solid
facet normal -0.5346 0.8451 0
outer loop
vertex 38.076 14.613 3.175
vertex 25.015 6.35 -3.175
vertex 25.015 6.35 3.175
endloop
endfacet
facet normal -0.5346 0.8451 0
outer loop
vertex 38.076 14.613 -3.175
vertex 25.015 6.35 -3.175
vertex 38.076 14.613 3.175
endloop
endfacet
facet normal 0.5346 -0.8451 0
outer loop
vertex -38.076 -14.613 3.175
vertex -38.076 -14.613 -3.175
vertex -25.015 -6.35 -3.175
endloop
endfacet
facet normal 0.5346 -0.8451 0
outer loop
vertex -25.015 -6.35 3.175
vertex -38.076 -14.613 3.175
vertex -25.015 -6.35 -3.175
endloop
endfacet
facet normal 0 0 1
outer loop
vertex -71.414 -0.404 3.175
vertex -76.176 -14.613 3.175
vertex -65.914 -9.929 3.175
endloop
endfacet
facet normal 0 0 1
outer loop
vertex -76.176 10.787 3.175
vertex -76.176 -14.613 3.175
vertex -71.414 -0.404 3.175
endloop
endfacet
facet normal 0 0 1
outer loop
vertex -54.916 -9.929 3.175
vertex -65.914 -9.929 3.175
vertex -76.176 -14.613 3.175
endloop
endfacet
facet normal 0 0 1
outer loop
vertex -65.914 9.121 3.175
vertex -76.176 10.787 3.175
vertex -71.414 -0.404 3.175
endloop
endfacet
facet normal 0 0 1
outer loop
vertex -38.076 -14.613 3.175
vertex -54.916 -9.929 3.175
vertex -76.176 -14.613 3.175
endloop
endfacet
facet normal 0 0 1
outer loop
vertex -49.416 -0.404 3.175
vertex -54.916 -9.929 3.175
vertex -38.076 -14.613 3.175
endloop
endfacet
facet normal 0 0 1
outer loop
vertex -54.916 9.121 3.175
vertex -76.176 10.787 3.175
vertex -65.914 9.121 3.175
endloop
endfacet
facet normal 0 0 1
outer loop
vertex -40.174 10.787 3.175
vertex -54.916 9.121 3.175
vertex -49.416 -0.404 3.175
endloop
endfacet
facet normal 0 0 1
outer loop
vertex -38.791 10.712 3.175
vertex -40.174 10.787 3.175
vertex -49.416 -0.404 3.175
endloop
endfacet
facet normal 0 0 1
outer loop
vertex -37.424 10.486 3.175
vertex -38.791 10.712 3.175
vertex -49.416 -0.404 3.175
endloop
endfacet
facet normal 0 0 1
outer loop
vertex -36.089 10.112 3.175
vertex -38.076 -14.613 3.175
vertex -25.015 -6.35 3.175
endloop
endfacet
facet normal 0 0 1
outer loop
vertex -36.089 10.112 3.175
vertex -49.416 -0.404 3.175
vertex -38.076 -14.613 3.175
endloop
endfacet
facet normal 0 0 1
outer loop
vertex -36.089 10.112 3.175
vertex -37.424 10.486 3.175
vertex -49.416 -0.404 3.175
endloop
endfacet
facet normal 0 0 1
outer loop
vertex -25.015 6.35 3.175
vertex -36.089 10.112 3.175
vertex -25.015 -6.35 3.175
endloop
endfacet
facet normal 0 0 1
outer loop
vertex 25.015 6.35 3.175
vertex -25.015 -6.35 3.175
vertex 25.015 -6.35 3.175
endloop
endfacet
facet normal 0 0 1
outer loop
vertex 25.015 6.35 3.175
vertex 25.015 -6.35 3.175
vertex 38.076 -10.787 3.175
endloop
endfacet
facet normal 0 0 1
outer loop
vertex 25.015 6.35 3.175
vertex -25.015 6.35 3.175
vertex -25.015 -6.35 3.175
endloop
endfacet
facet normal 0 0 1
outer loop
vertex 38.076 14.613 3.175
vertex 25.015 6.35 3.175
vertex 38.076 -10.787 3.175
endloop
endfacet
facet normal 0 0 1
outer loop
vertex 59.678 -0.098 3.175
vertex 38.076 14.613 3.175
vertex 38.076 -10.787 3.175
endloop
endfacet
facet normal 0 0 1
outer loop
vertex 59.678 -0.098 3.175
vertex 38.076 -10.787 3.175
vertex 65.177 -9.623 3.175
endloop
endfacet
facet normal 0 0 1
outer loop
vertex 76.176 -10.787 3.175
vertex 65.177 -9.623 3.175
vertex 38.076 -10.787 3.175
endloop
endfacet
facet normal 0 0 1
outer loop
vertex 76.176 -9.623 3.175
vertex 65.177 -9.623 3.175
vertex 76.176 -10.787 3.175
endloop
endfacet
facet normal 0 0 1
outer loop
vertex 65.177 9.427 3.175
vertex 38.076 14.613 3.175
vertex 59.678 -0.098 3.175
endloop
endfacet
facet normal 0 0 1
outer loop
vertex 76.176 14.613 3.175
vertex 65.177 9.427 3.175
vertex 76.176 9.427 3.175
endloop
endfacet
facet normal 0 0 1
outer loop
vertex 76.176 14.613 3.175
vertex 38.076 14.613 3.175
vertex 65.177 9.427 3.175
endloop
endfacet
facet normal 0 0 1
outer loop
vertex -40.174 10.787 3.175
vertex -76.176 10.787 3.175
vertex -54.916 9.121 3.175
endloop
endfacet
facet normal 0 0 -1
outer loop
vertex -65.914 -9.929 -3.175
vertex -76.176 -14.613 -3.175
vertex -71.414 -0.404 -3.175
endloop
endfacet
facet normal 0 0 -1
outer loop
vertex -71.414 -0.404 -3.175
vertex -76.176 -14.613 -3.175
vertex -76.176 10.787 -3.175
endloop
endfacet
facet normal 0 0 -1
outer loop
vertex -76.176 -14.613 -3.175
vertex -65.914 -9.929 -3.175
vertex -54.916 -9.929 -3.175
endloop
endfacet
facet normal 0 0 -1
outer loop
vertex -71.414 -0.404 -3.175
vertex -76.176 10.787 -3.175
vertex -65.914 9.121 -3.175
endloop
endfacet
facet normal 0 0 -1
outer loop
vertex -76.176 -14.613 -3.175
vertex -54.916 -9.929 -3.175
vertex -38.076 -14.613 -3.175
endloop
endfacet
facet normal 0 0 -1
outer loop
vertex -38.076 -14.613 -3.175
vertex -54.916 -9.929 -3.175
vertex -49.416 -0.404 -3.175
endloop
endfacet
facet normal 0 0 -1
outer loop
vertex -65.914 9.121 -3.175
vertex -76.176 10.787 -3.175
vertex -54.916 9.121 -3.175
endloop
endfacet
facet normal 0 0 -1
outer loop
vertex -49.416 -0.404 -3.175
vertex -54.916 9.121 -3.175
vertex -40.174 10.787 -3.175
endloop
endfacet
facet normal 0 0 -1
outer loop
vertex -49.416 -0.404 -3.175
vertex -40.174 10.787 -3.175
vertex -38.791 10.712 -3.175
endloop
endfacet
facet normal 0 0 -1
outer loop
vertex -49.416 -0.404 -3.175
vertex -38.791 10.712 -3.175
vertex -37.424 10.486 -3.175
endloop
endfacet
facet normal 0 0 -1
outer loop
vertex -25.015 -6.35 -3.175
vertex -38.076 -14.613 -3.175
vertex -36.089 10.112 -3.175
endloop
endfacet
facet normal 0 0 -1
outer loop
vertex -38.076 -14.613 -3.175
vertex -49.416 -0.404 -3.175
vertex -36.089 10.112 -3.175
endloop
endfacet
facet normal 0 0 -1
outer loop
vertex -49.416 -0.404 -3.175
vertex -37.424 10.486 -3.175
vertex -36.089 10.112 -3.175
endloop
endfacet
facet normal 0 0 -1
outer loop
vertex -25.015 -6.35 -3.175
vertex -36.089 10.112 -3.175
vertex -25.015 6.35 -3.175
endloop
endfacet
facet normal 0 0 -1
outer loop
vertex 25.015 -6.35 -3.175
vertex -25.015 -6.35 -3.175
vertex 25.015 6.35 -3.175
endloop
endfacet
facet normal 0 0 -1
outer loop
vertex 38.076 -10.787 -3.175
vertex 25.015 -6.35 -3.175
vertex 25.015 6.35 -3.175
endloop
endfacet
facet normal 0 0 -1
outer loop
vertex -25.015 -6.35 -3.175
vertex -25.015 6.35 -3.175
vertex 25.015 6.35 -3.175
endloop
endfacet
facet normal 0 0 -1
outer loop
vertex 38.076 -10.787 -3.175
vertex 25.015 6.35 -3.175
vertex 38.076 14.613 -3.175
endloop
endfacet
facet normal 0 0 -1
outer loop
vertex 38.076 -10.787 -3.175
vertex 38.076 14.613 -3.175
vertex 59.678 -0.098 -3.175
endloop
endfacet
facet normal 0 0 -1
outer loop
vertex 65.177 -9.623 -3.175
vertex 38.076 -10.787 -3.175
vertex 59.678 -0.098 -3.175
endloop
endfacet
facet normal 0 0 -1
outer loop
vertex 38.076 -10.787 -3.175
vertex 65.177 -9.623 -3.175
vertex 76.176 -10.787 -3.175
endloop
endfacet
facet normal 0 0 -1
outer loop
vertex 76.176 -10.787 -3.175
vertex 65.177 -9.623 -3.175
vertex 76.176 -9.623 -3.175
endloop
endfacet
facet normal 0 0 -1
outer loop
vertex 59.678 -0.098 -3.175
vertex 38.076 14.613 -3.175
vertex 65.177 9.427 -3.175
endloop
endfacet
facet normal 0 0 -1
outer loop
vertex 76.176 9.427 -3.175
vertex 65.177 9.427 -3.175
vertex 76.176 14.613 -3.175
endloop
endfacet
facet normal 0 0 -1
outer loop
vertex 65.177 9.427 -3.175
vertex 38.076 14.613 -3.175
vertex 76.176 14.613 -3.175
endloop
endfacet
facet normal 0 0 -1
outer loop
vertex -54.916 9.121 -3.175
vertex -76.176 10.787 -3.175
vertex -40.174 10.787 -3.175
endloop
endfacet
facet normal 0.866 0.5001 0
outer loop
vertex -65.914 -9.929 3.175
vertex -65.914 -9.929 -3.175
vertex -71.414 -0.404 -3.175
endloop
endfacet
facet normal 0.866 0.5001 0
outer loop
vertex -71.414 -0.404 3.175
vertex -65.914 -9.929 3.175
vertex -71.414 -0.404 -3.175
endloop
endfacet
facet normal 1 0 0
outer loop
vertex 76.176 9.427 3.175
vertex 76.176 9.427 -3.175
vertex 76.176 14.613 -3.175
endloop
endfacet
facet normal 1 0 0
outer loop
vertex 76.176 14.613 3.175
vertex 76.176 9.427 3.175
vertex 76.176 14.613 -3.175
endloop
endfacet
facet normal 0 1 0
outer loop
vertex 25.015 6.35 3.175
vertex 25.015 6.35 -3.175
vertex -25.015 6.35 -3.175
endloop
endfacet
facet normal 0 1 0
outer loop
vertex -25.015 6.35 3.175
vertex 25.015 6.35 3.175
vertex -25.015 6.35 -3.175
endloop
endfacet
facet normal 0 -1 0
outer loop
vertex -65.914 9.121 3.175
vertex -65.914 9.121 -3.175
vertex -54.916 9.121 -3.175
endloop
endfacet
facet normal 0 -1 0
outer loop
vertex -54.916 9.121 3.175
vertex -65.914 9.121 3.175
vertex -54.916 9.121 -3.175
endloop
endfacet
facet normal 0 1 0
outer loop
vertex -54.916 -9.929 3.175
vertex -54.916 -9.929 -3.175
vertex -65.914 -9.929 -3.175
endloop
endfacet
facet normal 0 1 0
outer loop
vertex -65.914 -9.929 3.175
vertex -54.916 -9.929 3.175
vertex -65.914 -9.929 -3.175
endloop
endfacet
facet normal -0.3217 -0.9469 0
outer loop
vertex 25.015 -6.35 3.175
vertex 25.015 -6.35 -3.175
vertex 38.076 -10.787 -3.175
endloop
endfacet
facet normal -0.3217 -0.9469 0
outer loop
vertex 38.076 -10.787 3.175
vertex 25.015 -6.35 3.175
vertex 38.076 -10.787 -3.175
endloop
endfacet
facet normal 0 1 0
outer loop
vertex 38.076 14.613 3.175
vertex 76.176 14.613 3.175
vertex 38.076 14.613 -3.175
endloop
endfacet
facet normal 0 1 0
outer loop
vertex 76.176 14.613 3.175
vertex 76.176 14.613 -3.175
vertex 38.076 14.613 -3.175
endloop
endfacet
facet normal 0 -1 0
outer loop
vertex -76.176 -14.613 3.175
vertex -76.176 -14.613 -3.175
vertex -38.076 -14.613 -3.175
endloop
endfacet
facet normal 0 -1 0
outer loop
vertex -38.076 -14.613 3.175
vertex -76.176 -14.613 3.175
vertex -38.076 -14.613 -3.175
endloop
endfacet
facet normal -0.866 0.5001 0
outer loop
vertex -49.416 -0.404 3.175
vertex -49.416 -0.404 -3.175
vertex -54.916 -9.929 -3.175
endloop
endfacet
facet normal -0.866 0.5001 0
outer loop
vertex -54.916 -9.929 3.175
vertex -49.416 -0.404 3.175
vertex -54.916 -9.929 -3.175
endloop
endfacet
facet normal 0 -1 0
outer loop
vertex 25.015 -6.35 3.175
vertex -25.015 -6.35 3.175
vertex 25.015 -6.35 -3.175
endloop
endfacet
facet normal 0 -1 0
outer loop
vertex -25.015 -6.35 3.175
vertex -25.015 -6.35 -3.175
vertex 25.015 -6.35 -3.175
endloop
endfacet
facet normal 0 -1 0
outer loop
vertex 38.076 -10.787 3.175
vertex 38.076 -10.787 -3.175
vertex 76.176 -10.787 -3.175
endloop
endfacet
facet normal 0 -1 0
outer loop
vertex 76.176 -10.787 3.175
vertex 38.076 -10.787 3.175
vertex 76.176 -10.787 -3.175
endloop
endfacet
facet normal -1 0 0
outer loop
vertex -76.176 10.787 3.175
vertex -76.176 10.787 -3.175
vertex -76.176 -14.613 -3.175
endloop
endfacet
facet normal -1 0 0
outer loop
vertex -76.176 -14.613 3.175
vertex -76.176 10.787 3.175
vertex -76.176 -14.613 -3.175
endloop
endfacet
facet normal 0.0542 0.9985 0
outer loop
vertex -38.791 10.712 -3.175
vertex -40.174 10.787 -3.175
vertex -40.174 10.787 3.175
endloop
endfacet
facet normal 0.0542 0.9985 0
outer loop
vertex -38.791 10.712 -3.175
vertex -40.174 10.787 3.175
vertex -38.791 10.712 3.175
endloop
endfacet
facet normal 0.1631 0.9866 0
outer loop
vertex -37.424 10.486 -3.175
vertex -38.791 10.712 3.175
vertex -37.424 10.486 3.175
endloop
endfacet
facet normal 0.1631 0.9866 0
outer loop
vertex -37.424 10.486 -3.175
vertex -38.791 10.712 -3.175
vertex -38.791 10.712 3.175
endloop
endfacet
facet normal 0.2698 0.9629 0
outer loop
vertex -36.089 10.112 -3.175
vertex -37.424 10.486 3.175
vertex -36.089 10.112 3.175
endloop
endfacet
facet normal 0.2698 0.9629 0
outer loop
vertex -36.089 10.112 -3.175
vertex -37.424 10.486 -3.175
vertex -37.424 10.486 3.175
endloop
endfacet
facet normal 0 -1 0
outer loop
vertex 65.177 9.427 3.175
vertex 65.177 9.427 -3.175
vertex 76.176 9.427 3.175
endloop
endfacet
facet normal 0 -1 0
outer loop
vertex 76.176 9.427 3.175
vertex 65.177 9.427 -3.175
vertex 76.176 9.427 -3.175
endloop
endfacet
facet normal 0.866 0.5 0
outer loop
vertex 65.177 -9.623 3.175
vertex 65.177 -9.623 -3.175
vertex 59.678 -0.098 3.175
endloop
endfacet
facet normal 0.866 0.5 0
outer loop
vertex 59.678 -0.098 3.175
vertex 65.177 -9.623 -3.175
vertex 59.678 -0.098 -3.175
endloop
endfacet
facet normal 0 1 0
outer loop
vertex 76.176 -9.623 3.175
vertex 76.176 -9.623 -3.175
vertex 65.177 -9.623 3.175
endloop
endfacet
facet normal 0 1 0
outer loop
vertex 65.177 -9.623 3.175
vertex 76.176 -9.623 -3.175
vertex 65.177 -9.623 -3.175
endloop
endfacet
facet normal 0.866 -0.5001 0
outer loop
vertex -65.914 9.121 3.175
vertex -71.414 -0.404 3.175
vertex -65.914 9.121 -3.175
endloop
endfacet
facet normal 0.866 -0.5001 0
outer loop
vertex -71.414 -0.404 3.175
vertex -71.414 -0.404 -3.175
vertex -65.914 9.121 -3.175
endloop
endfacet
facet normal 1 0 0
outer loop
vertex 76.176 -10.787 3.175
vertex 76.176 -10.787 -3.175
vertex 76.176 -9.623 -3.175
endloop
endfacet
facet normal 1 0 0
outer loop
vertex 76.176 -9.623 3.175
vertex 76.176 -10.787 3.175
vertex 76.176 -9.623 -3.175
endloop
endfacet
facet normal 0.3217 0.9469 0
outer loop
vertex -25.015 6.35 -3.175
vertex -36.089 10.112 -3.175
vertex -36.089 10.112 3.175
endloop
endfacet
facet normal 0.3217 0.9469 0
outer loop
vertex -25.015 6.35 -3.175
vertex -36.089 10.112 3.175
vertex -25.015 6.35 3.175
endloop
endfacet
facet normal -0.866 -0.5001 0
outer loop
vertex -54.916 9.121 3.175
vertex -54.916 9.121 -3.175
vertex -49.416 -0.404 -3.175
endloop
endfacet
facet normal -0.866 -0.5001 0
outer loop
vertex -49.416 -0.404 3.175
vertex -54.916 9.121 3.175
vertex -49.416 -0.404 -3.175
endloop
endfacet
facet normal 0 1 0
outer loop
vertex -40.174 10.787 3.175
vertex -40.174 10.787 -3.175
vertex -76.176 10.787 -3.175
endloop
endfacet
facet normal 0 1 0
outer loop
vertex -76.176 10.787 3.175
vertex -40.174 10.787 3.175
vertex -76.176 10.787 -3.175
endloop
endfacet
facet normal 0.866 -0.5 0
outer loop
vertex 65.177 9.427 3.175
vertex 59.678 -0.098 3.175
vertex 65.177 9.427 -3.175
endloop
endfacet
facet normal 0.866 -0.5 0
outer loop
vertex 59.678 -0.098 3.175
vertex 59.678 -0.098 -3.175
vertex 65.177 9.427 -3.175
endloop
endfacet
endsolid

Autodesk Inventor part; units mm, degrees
ref_plane "YZ Plane" through (0, 0, 0) normal (1, 0, 0) x (0, 1, 0)
ref_plane "XZ Plane" through (0, 0, 0) normal (0, 1, 0) x (-1, 0, 0)
ref_plane "XY Plane" through (0, 0, 0) normal (0, 0, 1) x (1, 0, 0)
sketch "Sketch1" plane through (0, 0, 0) normal (0, 0, 1) x (1, 0, 0)
  line L0 (76.176, -10.7873) -> (76.176, 14.6127)
  line L1 (-76.176, 10.7873) -> (-76.176, -14.6127)
  line L2 (-76.176, -14.6127) -> (76.176, 14.6127) construction
  line L3 (76.176, -10.7873) -> (-76.176, 10.7873) construction
  line L4 (76.176, 9.4269) -> (81.6753, -0.0981)
  line L5 (81.6753, -0.0981) -> (76.176, -9.6231)
  line L6 (76.176, -9.6231) -> (65.1775, -9.6231)
  line L7 (65.1775, -9.6231) -> (59.6782, -0.0981)
  line L8 (59.6782, -0.0981) -> (65.1775, 9.4269)
  line L9 (65.1775, 9.4269) -> (76.176, 9.4269)
  line L10 (76.176, 9.4269) -> (76.176, -9.6231) construction
  line L11 (-54.9157, 9.1213) -> (-49.4164, -0.4037)
  line L12 (-49.4164, -0.4037) -> (-54.9157, -9.9287)
  line L13 (-54.9157, -9.9287) -> (-65.9142, -9.9287)
  line L14 (-65.9142, -9.9287) -> (-71.4135, -0.4037)
  line L15 (-71.4135, -0.4037) -> (-65.9142, 9.1213)
  line L16 (-65.9142, 9.1213) -> (-54.9157, 9.1213)
  line L17 (-76.176, -14.6127) -> (-38.076, -14.6127) construction
  line L18 (-38.076, -14.6127) -> (-38.076, 10.7873) construction
  line L19 (-40.1744, 10.7873) -> (-76.176, 10.7873) construction
  line L20 (-76.176, 10.7873) -> (-76.176, -14.6127) construction
  line L21 (76.176, 14.6127) -> (38.076, 14.6127) construction
  line L22 (38.076, 14.6127) -> (38.076, -10.7873) construction
  line L23 (38.076, -10.7873) -> (76.176, -10.7873) construction
  line L24 (76.176, -10.7873) -> (76.176, 14.6127) construction
  line L25 (-25.0148, -6.35) -> (25.0148, -6.35) construction
  line L26 (25.0148, -6.35) -> (25.0148, 6.35) construction
  line L27 (25.0148, 6.35) -> (-25.0148, 6.35) construction
  line L28 (-25.0148, 6.35) -> (-25.0148, -6.35) construction
  line L29 (-25.0148, -6.35) -> (25.0148, 6.35) construction
  line L30 (25.0148, -6.35) -> (-25.0148, 6.35) construction
  line L31 (-36.0891, 10.1123) -> (-25.0148, 6.35)
  line L32 (25.0148, 6.35) -> (38.076, 14.6127)
  line L33 (25.0148, 6.35) -> (-25.0148, 6.35)
  line L34 (-38.076, -14.6127) -> (-25.0148, -6.35)
  line L35 (-25.0148, -6.35) -> (25.0148, -6.35)
  line L36 (25.0148, -6.35) -> (38.076, -10.7873)
  line L37 (76.176, 14.6127) -> (38.076, 14.6127)
  line L38 (-38.076, 10.7873) -> (-76.176, 10.7873)
  line L39 (-76.176, -14.6127) -> (-38.076, -14.6127)
  line L40 (38.076, -10.7873) -> (76.176, -10.7873)
  arc A0 (-36.0891, 10.1123) -> (-40.1744, 10.7873) centre (-40.1744, -1.9127) ccw
  point P0 (0, 0)
  point P1 (70.6767, -0.0981)
  point P2 (-60.415, -0.4037)
  point P3 (76.176, -9.6231)
  point P4 (76.176, 9.4269)
  dimension "totalLength" = 152.4
  dimension "d1" = 25.4
  dimension "d2" = 19.05
  dimension "d3" = 4.7625
  dimension "d4" = 19.05
  dimension "d5" = 38.1
  dimension "d6" = 38.1
  dimension "d8" = 12.7
  dimension "d9" = 12.7
extrude "Extrusion1" add sketch "Sketch1" along normal mid plane 6.35 contours L40 L36 L35 L34 L39 L1 L38 A0 L31 L33 L32 L37 L0 L9 L8 L7 L6
properties part number "Whack01"
